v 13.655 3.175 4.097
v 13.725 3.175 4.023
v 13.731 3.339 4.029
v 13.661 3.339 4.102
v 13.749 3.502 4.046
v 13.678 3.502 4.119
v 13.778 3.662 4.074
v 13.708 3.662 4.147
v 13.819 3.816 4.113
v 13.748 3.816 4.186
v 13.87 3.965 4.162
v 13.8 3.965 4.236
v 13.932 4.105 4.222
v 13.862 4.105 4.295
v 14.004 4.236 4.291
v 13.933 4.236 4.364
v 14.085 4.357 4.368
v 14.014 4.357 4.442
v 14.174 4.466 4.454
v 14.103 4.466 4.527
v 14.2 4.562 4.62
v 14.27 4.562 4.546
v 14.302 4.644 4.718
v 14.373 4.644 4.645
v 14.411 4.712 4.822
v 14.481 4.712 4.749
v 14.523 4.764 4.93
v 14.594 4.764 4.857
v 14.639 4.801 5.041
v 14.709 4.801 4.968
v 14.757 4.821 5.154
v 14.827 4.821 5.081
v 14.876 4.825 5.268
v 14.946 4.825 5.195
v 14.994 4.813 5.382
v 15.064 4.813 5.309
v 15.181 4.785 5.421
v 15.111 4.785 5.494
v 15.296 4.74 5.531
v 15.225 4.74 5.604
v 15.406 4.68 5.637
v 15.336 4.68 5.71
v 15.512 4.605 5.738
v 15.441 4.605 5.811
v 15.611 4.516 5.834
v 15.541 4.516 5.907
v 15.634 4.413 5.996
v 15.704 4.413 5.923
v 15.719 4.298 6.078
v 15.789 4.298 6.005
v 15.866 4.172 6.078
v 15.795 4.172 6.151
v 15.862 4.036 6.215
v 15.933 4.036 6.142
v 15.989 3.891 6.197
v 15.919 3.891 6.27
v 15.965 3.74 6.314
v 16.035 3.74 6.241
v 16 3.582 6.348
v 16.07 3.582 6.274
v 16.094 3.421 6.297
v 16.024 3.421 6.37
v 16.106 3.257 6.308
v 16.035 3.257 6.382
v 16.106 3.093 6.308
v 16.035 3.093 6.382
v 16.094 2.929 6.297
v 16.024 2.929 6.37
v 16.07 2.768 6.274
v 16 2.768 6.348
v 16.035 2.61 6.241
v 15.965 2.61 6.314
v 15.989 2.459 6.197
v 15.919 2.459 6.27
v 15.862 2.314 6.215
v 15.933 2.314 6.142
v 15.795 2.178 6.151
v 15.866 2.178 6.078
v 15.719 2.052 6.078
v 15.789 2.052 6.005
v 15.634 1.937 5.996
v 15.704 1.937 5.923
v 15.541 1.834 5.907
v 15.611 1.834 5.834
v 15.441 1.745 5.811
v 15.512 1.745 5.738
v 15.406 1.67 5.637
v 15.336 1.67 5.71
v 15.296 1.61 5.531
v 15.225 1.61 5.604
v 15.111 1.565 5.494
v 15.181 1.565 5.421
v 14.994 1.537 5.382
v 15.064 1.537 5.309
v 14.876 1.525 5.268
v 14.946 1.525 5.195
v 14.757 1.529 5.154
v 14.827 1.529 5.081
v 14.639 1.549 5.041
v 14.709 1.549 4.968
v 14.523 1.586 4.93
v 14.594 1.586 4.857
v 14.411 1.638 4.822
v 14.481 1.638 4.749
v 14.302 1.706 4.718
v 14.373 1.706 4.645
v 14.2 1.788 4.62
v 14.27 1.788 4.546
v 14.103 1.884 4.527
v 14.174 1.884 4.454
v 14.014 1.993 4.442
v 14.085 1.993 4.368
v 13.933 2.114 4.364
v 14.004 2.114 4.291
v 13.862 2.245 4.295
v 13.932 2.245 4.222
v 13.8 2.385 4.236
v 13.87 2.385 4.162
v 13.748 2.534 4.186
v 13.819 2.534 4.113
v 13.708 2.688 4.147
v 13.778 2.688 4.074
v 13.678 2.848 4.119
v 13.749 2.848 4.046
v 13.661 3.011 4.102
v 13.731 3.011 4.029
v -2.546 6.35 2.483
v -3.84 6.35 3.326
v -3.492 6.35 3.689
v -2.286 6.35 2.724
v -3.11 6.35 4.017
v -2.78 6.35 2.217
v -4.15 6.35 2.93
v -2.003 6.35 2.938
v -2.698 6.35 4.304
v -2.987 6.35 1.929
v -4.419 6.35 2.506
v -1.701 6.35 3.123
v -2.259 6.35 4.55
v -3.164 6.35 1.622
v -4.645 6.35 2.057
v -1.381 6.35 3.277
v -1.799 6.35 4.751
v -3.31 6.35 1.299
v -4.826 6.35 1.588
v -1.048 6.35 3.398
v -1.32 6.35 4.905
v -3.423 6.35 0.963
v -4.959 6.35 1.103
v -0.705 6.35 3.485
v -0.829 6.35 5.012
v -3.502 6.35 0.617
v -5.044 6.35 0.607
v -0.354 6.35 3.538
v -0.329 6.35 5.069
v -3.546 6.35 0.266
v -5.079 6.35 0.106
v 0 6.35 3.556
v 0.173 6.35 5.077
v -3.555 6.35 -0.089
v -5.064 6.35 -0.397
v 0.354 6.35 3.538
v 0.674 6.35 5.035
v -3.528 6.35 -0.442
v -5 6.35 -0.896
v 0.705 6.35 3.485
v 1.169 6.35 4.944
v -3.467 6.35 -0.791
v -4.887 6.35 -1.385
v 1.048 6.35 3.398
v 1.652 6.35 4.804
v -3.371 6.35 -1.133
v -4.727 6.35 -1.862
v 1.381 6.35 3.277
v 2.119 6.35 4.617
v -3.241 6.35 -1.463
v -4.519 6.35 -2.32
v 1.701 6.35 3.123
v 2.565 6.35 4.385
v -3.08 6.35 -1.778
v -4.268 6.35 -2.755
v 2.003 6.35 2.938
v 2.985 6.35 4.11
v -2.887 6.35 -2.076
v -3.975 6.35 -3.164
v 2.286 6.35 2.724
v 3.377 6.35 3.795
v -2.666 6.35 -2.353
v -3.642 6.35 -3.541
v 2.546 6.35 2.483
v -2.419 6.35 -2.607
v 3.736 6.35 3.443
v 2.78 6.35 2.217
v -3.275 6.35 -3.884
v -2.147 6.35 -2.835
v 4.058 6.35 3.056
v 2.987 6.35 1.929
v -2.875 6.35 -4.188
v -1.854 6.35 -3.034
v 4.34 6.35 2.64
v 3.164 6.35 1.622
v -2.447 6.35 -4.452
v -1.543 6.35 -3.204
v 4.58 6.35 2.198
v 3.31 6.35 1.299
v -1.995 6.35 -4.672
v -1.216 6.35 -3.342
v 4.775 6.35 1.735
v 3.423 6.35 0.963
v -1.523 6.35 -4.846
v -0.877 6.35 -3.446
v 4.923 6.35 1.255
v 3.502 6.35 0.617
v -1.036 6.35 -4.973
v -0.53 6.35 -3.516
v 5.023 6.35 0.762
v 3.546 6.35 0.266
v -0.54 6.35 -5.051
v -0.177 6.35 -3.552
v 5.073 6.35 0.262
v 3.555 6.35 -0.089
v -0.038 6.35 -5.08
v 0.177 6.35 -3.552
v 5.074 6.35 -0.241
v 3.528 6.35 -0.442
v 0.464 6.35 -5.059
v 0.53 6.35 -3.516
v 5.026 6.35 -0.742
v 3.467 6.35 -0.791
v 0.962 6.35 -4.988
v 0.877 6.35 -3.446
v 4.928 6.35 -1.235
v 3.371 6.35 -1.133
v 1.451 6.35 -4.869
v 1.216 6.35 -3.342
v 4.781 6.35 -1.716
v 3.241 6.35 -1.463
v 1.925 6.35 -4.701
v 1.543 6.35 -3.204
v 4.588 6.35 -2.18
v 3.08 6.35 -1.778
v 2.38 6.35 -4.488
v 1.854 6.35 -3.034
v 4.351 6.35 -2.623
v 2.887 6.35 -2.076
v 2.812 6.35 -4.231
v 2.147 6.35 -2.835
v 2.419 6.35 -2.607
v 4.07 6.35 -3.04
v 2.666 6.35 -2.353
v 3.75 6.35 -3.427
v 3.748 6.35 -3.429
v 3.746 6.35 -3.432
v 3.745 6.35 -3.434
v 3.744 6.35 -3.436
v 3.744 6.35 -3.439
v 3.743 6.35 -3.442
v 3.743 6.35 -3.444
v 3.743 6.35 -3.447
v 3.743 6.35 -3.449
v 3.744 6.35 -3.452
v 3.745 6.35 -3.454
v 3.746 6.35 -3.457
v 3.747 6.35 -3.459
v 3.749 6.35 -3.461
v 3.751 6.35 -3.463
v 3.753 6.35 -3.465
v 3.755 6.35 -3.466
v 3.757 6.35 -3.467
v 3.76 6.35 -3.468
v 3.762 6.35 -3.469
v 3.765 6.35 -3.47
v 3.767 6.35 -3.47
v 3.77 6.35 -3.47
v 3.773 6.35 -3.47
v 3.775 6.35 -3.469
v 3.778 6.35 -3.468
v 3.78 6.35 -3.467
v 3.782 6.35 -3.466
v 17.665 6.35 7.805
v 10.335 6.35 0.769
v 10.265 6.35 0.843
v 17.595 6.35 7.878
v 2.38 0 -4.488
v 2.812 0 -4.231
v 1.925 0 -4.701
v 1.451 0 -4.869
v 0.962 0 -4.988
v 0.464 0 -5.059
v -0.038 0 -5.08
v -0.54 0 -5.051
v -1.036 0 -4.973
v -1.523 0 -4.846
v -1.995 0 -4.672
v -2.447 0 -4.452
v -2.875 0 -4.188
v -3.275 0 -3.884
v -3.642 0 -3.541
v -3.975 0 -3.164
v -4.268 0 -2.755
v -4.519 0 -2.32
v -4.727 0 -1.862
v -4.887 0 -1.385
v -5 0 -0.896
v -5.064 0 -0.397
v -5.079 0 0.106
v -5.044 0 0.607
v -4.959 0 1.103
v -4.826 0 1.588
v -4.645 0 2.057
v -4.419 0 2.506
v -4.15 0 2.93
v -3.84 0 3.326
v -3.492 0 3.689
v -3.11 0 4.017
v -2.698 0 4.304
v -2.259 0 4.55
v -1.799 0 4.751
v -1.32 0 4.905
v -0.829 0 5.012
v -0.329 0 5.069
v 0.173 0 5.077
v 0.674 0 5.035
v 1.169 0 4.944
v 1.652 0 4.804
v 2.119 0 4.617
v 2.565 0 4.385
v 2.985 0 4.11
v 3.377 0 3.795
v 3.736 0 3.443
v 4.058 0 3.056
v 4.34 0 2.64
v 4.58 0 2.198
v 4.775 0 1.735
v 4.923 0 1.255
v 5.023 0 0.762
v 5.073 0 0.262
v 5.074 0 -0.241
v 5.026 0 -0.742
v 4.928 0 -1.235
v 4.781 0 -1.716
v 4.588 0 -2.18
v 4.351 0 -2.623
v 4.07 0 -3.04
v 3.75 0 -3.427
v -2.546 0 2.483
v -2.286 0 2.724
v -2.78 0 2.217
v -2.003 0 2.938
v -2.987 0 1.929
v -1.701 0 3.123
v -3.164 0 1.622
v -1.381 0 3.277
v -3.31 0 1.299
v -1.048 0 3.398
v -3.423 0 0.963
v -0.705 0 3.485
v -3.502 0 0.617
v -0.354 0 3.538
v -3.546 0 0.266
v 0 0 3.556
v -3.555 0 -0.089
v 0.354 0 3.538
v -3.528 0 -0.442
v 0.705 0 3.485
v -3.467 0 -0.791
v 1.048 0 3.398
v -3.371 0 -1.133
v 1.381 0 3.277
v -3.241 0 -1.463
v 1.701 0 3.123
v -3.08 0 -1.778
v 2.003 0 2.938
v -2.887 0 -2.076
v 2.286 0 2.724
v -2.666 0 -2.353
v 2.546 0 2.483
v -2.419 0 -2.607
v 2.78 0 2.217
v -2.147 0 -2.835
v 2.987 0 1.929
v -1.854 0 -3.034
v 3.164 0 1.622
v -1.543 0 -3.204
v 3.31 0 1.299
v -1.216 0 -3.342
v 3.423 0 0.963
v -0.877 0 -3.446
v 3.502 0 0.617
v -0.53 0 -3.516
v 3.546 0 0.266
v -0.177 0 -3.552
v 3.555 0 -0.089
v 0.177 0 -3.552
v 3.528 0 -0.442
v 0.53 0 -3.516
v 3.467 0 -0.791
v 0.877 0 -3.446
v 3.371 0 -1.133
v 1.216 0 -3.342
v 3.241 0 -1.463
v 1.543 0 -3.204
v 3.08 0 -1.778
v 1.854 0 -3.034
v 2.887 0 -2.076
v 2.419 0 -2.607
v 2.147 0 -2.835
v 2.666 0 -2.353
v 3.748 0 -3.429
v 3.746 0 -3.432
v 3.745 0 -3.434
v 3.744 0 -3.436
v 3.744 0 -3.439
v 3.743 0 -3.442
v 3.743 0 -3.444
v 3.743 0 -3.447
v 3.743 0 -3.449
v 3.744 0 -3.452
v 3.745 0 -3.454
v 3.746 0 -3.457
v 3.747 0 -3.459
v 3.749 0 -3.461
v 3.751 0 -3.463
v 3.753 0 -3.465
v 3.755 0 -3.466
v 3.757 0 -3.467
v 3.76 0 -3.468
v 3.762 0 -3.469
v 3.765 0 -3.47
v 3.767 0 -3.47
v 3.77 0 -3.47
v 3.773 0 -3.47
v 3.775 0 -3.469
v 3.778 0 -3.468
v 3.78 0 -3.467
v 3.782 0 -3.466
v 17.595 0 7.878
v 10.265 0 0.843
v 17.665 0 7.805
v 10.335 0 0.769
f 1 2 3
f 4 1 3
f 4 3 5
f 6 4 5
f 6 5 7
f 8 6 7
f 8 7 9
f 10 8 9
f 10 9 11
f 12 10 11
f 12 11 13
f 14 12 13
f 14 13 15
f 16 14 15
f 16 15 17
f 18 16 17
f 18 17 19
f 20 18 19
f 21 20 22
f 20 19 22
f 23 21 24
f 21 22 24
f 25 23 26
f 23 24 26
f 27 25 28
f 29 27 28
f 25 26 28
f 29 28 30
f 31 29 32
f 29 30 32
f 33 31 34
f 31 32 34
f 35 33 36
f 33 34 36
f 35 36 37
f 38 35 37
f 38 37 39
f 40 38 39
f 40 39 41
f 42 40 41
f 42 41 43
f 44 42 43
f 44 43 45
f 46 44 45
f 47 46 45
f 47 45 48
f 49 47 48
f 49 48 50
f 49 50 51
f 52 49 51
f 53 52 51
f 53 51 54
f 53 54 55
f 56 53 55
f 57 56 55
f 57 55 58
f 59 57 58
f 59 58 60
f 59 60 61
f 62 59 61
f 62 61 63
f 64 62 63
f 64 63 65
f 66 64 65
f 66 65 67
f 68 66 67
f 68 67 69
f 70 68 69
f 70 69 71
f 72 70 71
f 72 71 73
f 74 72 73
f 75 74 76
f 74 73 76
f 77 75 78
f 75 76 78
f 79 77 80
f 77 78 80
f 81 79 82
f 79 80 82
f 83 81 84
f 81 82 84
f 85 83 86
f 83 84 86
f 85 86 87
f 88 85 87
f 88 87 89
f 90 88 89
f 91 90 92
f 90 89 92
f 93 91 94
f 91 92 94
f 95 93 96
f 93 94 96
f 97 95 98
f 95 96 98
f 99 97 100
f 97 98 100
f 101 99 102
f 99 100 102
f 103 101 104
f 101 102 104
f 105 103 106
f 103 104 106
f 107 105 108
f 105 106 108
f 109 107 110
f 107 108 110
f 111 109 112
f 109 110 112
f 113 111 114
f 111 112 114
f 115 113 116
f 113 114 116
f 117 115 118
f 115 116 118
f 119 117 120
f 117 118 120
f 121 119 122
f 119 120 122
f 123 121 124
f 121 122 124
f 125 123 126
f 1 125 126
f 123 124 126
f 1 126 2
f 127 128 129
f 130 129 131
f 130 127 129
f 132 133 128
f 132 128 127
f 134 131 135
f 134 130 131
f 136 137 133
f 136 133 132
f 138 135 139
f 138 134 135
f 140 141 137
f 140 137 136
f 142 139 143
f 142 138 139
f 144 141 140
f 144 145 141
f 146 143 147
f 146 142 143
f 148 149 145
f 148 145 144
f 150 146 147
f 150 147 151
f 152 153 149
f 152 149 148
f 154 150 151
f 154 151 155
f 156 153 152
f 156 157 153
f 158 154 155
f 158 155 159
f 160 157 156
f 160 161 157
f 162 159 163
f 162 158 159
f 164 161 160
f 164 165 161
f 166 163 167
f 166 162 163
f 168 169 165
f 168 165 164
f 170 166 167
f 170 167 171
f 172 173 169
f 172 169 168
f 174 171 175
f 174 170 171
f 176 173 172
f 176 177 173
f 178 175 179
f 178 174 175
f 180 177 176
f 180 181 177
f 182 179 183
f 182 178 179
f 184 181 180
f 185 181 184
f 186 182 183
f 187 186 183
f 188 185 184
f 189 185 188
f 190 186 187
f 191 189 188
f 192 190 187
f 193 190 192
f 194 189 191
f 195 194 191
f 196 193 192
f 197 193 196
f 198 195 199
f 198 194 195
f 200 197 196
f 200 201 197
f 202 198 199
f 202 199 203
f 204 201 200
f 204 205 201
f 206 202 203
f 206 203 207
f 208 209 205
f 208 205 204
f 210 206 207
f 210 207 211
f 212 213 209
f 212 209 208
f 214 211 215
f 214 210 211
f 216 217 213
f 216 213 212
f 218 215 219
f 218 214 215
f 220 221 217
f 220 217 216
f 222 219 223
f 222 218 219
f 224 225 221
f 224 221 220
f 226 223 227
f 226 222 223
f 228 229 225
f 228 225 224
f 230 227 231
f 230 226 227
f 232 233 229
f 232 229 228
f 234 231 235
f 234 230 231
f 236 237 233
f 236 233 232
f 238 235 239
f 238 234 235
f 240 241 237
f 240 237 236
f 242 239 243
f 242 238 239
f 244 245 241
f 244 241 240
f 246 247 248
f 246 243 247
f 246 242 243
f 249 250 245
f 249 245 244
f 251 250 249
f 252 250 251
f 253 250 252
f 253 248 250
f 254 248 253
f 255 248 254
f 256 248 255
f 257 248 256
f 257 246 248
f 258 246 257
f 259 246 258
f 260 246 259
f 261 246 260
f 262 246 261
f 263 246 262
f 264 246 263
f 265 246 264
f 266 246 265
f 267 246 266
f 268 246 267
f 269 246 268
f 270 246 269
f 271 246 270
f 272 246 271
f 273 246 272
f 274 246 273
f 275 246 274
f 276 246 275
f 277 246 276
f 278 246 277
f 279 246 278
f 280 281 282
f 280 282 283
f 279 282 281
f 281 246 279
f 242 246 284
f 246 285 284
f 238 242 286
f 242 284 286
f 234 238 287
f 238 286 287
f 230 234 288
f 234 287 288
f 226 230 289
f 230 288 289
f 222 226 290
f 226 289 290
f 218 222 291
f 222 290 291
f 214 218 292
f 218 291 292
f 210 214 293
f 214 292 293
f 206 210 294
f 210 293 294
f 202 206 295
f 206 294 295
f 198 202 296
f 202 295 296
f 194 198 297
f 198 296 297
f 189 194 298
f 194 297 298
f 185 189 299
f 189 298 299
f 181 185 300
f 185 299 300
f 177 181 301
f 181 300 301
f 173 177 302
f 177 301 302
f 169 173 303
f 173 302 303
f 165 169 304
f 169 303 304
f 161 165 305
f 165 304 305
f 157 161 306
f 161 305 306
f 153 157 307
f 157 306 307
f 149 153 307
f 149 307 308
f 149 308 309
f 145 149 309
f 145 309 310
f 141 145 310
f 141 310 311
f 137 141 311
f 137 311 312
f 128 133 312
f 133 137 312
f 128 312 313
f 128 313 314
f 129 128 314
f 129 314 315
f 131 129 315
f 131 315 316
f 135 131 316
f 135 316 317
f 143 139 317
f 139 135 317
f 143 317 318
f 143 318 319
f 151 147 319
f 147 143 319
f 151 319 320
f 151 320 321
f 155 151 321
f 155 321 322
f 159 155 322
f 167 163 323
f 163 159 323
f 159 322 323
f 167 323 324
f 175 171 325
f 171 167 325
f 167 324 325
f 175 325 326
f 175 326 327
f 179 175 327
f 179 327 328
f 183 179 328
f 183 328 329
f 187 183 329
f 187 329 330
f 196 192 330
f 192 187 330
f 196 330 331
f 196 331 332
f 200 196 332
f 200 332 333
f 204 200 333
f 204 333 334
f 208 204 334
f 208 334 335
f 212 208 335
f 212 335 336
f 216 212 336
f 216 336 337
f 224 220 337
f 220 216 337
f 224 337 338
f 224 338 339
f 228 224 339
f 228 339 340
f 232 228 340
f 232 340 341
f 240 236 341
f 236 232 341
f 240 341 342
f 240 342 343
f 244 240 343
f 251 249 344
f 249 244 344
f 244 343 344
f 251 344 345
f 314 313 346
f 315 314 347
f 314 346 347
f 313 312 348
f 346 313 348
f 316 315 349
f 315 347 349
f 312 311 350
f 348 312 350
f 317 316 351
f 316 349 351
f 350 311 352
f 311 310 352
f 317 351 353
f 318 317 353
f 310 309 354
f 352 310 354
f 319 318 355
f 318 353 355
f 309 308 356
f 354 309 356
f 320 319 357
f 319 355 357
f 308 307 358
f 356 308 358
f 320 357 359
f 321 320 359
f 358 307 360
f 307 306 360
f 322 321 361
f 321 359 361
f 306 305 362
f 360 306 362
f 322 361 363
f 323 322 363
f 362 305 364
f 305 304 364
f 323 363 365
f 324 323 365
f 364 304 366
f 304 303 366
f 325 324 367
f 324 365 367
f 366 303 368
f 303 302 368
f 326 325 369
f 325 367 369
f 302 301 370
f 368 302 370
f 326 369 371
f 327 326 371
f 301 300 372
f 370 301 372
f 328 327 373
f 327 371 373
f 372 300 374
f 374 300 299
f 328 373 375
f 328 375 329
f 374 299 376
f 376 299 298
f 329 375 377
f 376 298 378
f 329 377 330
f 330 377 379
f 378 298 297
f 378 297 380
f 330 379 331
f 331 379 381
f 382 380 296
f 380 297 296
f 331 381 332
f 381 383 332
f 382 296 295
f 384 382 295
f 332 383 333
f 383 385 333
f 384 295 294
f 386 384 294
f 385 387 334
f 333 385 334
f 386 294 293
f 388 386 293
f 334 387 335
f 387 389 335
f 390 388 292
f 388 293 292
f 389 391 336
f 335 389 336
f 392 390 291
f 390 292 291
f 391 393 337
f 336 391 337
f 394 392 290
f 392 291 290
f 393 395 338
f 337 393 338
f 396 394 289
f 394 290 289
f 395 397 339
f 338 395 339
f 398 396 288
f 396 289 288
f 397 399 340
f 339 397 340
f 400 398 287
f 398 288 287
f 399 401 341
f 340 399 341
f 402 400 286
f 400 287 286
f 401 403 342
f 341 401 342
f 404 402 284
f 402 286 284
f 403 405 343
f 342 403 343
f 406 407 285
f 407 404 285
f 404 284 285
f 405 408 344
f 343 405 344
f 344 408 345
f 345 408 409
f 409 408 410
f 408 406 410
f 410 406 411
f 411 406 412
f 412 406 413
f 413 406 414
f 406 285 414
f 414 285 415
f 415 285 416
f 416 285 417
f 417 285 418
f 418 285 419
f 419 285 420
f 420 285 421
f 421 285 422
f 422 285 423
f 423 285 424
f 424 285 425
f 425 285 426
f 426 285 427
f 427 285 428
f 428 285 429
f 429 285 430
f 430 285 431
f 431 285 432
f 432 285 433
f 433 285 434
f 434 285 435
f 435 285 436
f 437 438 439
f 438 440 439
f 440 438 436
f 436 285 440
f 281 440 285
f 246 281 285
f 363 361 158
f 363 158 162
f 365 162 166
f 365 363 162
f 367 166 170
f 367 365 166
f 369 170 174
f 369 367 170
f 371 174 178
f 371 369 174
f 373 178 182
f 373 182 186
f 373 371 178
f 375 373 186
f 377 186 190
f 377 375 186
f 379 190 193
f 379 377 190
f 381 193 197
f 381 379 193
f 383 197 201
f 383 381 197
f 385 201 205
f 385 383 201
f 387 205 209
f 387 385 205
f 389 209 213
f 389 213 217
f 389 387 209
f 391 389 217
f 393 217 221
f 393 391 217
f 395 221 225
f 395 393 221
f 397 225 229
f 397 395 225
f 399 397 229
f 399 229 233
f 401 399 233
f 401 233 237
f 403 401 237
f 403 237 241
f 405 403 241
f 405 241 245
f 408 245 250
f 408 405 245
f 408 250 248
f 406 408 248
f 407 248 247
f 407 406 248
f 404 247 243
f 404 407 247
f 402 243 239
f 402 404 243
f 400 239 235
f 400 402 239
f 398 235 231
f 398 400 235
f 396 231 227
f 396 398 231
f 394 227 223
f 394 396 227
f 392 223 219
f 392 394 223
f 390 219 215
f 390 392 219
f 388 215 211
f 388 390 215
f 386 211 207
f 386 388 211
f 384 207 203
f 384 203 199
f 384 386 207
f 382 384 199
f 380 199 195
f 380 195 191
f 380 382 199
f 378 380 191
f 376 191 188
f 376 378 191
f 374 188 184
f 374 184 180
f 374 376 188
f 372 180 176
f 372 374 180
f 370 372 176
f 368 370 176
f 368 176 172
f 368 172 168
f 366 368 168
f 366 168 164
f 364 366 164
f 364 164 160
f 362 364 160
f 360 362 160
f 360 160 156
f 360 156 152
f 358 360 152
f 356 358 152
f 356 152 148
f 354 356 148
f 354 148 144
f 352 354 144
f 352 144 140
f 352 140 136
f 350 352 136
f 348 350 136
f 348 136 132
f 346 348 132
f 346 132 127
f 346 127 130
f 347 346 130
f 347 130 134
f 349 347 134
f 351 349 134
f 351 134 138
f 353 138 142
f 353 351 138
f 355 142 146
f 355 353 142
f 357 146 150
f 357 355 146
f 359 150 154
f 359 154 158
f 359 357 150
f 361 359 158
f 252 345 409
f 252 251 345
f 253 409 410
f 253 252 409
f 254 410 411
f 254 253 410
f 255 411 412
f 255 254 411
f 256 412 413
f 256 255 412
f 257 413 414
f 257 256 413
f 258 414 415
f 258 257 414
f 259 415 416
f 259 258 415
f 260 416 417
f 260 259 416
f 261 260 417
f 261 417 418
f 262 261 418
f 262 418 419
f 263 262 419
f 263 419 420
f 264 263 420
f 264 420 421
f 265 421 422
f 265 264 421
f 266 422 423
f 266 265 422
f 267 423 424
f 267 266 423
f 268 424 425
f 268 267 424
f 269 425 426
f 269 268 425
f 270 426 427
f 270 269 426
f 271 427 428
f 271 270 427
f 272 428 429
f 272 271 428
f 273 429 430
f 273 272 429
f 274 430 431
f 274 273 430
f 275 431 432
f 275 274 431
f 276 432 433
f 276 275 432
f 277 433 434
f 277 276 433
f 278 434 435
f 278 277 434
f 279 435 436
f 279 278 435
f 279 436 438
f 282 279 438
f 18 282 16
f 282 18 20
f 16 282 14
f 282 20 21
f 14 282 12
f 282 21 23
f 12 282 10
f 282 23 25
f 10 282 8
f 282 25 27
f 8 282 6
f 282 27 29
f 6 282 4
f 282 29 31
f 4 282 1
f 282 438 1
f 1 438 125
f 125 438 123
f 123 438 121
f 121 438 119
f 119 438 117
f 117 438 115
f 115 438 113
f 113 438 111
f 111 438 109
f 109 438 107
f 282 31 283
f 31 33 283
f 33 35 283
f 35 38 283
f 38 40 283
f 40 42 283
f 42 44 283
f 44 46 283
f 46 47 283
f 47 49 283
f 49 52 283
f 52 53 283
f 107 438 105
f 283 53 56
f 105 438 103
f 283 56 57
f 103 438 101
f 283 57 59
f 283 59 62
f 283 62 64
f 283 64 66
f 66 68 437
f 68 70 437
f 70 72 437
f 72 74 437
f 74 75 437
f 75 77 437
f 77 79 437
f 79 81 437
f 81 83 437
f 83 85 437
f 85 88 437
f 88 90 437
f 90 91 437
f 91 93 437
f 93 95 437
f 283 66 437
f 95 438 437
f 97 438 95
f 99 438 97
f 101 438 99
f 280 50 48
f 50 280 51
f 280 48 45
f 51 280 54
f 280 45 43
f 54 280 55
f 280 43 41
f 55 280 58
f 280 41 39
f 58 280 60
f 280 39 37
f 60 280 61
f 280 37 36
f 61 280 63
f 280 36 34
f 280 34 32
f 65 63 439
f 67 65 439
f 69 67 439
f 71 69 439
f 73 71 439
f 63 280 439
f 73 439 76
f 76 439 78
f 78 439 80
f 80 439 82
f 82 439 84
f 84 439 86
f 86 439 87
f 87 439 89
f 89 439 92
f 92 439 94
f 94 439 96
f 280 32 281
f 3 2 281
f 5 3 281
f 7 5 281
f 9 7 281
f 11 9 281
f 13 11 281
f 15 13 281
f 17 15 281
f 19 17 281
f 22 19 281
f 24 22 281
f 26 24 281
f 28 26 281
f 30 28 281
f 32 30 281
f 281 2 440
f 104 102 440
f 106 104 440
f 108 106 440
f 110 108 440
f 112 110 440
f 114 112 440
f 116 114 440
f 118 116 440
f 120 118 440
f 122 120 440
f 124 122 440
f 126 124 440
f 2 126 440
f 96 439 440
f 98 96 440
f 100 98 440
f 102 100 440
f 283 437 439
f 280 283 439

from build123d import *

# Parameters (mm, degrees)
SKETCH1_R           = 3.556
BOSS_EXTRUDE1_DEPTH = 6.35
SKETCH2_R           = 1.651
CUT_EXTRUDE1_DEPTH  = 6.35
FILLET1_R           = 0.0254


with BuildPart() as part:
    # Sketch1 → Boss-Extrude1 (new body)
    with BuildSketch(Plane(origin=(0, 0, 0), x_dir=(1, 0, 0), z_dir=(0, 1, 0))):
        with BuildLine():
            Line((17.664907311, -7.804824457), (10.3349883, -0.769350962))
            Line((10.3349883, -0.769350962), (2.811937974, 4.230768822))
            ThreePointArc((2.811937974, 4.230768822), (-3.21777664, -3.93094308), (3.5918694, 3.592335482))
            Line((3.5918694, 3.592335482), (10.264633565, -0.842650153))
            Line((10.264633565, -0.842650153), (17.594552576, -7.878123647))
            Line((17.594552576, -7.878123647), (17.664907311, -7.804824457))
        make_face()
        Circle(SKETCH1_R, mode=Mode.SUBTRACT)
    extrude(amount=BOSS_EXTRUDE1_DEPTH)

    # Sketch2 → Cut-Extrude1 (cut)
    with BuildSketch(Plane(origin=(3.836508416, 0, -5.468082617), x_dir=(-0.7214487215857361, 0, -0.6924678636025697), z_dir=(0.6924678636025697, 0, -0.7214487215857361))):
        with Locations((-15.35754231, 3.175)):
            Circle(SKETCH2_R)
    extrude(amount=-CUT_EXTRUDE1_DEPTH, mode=Mode.SUBTRACT)

    # Fillet1
    fillet1_edges = [part.edges().sort_by_distance(p)[0] for p in [
        (3.5918694, 3.175, -3.592335482),
    ]]
    fillet(fillet1_edges, radius=FILLET1_R)


solid = part.part
